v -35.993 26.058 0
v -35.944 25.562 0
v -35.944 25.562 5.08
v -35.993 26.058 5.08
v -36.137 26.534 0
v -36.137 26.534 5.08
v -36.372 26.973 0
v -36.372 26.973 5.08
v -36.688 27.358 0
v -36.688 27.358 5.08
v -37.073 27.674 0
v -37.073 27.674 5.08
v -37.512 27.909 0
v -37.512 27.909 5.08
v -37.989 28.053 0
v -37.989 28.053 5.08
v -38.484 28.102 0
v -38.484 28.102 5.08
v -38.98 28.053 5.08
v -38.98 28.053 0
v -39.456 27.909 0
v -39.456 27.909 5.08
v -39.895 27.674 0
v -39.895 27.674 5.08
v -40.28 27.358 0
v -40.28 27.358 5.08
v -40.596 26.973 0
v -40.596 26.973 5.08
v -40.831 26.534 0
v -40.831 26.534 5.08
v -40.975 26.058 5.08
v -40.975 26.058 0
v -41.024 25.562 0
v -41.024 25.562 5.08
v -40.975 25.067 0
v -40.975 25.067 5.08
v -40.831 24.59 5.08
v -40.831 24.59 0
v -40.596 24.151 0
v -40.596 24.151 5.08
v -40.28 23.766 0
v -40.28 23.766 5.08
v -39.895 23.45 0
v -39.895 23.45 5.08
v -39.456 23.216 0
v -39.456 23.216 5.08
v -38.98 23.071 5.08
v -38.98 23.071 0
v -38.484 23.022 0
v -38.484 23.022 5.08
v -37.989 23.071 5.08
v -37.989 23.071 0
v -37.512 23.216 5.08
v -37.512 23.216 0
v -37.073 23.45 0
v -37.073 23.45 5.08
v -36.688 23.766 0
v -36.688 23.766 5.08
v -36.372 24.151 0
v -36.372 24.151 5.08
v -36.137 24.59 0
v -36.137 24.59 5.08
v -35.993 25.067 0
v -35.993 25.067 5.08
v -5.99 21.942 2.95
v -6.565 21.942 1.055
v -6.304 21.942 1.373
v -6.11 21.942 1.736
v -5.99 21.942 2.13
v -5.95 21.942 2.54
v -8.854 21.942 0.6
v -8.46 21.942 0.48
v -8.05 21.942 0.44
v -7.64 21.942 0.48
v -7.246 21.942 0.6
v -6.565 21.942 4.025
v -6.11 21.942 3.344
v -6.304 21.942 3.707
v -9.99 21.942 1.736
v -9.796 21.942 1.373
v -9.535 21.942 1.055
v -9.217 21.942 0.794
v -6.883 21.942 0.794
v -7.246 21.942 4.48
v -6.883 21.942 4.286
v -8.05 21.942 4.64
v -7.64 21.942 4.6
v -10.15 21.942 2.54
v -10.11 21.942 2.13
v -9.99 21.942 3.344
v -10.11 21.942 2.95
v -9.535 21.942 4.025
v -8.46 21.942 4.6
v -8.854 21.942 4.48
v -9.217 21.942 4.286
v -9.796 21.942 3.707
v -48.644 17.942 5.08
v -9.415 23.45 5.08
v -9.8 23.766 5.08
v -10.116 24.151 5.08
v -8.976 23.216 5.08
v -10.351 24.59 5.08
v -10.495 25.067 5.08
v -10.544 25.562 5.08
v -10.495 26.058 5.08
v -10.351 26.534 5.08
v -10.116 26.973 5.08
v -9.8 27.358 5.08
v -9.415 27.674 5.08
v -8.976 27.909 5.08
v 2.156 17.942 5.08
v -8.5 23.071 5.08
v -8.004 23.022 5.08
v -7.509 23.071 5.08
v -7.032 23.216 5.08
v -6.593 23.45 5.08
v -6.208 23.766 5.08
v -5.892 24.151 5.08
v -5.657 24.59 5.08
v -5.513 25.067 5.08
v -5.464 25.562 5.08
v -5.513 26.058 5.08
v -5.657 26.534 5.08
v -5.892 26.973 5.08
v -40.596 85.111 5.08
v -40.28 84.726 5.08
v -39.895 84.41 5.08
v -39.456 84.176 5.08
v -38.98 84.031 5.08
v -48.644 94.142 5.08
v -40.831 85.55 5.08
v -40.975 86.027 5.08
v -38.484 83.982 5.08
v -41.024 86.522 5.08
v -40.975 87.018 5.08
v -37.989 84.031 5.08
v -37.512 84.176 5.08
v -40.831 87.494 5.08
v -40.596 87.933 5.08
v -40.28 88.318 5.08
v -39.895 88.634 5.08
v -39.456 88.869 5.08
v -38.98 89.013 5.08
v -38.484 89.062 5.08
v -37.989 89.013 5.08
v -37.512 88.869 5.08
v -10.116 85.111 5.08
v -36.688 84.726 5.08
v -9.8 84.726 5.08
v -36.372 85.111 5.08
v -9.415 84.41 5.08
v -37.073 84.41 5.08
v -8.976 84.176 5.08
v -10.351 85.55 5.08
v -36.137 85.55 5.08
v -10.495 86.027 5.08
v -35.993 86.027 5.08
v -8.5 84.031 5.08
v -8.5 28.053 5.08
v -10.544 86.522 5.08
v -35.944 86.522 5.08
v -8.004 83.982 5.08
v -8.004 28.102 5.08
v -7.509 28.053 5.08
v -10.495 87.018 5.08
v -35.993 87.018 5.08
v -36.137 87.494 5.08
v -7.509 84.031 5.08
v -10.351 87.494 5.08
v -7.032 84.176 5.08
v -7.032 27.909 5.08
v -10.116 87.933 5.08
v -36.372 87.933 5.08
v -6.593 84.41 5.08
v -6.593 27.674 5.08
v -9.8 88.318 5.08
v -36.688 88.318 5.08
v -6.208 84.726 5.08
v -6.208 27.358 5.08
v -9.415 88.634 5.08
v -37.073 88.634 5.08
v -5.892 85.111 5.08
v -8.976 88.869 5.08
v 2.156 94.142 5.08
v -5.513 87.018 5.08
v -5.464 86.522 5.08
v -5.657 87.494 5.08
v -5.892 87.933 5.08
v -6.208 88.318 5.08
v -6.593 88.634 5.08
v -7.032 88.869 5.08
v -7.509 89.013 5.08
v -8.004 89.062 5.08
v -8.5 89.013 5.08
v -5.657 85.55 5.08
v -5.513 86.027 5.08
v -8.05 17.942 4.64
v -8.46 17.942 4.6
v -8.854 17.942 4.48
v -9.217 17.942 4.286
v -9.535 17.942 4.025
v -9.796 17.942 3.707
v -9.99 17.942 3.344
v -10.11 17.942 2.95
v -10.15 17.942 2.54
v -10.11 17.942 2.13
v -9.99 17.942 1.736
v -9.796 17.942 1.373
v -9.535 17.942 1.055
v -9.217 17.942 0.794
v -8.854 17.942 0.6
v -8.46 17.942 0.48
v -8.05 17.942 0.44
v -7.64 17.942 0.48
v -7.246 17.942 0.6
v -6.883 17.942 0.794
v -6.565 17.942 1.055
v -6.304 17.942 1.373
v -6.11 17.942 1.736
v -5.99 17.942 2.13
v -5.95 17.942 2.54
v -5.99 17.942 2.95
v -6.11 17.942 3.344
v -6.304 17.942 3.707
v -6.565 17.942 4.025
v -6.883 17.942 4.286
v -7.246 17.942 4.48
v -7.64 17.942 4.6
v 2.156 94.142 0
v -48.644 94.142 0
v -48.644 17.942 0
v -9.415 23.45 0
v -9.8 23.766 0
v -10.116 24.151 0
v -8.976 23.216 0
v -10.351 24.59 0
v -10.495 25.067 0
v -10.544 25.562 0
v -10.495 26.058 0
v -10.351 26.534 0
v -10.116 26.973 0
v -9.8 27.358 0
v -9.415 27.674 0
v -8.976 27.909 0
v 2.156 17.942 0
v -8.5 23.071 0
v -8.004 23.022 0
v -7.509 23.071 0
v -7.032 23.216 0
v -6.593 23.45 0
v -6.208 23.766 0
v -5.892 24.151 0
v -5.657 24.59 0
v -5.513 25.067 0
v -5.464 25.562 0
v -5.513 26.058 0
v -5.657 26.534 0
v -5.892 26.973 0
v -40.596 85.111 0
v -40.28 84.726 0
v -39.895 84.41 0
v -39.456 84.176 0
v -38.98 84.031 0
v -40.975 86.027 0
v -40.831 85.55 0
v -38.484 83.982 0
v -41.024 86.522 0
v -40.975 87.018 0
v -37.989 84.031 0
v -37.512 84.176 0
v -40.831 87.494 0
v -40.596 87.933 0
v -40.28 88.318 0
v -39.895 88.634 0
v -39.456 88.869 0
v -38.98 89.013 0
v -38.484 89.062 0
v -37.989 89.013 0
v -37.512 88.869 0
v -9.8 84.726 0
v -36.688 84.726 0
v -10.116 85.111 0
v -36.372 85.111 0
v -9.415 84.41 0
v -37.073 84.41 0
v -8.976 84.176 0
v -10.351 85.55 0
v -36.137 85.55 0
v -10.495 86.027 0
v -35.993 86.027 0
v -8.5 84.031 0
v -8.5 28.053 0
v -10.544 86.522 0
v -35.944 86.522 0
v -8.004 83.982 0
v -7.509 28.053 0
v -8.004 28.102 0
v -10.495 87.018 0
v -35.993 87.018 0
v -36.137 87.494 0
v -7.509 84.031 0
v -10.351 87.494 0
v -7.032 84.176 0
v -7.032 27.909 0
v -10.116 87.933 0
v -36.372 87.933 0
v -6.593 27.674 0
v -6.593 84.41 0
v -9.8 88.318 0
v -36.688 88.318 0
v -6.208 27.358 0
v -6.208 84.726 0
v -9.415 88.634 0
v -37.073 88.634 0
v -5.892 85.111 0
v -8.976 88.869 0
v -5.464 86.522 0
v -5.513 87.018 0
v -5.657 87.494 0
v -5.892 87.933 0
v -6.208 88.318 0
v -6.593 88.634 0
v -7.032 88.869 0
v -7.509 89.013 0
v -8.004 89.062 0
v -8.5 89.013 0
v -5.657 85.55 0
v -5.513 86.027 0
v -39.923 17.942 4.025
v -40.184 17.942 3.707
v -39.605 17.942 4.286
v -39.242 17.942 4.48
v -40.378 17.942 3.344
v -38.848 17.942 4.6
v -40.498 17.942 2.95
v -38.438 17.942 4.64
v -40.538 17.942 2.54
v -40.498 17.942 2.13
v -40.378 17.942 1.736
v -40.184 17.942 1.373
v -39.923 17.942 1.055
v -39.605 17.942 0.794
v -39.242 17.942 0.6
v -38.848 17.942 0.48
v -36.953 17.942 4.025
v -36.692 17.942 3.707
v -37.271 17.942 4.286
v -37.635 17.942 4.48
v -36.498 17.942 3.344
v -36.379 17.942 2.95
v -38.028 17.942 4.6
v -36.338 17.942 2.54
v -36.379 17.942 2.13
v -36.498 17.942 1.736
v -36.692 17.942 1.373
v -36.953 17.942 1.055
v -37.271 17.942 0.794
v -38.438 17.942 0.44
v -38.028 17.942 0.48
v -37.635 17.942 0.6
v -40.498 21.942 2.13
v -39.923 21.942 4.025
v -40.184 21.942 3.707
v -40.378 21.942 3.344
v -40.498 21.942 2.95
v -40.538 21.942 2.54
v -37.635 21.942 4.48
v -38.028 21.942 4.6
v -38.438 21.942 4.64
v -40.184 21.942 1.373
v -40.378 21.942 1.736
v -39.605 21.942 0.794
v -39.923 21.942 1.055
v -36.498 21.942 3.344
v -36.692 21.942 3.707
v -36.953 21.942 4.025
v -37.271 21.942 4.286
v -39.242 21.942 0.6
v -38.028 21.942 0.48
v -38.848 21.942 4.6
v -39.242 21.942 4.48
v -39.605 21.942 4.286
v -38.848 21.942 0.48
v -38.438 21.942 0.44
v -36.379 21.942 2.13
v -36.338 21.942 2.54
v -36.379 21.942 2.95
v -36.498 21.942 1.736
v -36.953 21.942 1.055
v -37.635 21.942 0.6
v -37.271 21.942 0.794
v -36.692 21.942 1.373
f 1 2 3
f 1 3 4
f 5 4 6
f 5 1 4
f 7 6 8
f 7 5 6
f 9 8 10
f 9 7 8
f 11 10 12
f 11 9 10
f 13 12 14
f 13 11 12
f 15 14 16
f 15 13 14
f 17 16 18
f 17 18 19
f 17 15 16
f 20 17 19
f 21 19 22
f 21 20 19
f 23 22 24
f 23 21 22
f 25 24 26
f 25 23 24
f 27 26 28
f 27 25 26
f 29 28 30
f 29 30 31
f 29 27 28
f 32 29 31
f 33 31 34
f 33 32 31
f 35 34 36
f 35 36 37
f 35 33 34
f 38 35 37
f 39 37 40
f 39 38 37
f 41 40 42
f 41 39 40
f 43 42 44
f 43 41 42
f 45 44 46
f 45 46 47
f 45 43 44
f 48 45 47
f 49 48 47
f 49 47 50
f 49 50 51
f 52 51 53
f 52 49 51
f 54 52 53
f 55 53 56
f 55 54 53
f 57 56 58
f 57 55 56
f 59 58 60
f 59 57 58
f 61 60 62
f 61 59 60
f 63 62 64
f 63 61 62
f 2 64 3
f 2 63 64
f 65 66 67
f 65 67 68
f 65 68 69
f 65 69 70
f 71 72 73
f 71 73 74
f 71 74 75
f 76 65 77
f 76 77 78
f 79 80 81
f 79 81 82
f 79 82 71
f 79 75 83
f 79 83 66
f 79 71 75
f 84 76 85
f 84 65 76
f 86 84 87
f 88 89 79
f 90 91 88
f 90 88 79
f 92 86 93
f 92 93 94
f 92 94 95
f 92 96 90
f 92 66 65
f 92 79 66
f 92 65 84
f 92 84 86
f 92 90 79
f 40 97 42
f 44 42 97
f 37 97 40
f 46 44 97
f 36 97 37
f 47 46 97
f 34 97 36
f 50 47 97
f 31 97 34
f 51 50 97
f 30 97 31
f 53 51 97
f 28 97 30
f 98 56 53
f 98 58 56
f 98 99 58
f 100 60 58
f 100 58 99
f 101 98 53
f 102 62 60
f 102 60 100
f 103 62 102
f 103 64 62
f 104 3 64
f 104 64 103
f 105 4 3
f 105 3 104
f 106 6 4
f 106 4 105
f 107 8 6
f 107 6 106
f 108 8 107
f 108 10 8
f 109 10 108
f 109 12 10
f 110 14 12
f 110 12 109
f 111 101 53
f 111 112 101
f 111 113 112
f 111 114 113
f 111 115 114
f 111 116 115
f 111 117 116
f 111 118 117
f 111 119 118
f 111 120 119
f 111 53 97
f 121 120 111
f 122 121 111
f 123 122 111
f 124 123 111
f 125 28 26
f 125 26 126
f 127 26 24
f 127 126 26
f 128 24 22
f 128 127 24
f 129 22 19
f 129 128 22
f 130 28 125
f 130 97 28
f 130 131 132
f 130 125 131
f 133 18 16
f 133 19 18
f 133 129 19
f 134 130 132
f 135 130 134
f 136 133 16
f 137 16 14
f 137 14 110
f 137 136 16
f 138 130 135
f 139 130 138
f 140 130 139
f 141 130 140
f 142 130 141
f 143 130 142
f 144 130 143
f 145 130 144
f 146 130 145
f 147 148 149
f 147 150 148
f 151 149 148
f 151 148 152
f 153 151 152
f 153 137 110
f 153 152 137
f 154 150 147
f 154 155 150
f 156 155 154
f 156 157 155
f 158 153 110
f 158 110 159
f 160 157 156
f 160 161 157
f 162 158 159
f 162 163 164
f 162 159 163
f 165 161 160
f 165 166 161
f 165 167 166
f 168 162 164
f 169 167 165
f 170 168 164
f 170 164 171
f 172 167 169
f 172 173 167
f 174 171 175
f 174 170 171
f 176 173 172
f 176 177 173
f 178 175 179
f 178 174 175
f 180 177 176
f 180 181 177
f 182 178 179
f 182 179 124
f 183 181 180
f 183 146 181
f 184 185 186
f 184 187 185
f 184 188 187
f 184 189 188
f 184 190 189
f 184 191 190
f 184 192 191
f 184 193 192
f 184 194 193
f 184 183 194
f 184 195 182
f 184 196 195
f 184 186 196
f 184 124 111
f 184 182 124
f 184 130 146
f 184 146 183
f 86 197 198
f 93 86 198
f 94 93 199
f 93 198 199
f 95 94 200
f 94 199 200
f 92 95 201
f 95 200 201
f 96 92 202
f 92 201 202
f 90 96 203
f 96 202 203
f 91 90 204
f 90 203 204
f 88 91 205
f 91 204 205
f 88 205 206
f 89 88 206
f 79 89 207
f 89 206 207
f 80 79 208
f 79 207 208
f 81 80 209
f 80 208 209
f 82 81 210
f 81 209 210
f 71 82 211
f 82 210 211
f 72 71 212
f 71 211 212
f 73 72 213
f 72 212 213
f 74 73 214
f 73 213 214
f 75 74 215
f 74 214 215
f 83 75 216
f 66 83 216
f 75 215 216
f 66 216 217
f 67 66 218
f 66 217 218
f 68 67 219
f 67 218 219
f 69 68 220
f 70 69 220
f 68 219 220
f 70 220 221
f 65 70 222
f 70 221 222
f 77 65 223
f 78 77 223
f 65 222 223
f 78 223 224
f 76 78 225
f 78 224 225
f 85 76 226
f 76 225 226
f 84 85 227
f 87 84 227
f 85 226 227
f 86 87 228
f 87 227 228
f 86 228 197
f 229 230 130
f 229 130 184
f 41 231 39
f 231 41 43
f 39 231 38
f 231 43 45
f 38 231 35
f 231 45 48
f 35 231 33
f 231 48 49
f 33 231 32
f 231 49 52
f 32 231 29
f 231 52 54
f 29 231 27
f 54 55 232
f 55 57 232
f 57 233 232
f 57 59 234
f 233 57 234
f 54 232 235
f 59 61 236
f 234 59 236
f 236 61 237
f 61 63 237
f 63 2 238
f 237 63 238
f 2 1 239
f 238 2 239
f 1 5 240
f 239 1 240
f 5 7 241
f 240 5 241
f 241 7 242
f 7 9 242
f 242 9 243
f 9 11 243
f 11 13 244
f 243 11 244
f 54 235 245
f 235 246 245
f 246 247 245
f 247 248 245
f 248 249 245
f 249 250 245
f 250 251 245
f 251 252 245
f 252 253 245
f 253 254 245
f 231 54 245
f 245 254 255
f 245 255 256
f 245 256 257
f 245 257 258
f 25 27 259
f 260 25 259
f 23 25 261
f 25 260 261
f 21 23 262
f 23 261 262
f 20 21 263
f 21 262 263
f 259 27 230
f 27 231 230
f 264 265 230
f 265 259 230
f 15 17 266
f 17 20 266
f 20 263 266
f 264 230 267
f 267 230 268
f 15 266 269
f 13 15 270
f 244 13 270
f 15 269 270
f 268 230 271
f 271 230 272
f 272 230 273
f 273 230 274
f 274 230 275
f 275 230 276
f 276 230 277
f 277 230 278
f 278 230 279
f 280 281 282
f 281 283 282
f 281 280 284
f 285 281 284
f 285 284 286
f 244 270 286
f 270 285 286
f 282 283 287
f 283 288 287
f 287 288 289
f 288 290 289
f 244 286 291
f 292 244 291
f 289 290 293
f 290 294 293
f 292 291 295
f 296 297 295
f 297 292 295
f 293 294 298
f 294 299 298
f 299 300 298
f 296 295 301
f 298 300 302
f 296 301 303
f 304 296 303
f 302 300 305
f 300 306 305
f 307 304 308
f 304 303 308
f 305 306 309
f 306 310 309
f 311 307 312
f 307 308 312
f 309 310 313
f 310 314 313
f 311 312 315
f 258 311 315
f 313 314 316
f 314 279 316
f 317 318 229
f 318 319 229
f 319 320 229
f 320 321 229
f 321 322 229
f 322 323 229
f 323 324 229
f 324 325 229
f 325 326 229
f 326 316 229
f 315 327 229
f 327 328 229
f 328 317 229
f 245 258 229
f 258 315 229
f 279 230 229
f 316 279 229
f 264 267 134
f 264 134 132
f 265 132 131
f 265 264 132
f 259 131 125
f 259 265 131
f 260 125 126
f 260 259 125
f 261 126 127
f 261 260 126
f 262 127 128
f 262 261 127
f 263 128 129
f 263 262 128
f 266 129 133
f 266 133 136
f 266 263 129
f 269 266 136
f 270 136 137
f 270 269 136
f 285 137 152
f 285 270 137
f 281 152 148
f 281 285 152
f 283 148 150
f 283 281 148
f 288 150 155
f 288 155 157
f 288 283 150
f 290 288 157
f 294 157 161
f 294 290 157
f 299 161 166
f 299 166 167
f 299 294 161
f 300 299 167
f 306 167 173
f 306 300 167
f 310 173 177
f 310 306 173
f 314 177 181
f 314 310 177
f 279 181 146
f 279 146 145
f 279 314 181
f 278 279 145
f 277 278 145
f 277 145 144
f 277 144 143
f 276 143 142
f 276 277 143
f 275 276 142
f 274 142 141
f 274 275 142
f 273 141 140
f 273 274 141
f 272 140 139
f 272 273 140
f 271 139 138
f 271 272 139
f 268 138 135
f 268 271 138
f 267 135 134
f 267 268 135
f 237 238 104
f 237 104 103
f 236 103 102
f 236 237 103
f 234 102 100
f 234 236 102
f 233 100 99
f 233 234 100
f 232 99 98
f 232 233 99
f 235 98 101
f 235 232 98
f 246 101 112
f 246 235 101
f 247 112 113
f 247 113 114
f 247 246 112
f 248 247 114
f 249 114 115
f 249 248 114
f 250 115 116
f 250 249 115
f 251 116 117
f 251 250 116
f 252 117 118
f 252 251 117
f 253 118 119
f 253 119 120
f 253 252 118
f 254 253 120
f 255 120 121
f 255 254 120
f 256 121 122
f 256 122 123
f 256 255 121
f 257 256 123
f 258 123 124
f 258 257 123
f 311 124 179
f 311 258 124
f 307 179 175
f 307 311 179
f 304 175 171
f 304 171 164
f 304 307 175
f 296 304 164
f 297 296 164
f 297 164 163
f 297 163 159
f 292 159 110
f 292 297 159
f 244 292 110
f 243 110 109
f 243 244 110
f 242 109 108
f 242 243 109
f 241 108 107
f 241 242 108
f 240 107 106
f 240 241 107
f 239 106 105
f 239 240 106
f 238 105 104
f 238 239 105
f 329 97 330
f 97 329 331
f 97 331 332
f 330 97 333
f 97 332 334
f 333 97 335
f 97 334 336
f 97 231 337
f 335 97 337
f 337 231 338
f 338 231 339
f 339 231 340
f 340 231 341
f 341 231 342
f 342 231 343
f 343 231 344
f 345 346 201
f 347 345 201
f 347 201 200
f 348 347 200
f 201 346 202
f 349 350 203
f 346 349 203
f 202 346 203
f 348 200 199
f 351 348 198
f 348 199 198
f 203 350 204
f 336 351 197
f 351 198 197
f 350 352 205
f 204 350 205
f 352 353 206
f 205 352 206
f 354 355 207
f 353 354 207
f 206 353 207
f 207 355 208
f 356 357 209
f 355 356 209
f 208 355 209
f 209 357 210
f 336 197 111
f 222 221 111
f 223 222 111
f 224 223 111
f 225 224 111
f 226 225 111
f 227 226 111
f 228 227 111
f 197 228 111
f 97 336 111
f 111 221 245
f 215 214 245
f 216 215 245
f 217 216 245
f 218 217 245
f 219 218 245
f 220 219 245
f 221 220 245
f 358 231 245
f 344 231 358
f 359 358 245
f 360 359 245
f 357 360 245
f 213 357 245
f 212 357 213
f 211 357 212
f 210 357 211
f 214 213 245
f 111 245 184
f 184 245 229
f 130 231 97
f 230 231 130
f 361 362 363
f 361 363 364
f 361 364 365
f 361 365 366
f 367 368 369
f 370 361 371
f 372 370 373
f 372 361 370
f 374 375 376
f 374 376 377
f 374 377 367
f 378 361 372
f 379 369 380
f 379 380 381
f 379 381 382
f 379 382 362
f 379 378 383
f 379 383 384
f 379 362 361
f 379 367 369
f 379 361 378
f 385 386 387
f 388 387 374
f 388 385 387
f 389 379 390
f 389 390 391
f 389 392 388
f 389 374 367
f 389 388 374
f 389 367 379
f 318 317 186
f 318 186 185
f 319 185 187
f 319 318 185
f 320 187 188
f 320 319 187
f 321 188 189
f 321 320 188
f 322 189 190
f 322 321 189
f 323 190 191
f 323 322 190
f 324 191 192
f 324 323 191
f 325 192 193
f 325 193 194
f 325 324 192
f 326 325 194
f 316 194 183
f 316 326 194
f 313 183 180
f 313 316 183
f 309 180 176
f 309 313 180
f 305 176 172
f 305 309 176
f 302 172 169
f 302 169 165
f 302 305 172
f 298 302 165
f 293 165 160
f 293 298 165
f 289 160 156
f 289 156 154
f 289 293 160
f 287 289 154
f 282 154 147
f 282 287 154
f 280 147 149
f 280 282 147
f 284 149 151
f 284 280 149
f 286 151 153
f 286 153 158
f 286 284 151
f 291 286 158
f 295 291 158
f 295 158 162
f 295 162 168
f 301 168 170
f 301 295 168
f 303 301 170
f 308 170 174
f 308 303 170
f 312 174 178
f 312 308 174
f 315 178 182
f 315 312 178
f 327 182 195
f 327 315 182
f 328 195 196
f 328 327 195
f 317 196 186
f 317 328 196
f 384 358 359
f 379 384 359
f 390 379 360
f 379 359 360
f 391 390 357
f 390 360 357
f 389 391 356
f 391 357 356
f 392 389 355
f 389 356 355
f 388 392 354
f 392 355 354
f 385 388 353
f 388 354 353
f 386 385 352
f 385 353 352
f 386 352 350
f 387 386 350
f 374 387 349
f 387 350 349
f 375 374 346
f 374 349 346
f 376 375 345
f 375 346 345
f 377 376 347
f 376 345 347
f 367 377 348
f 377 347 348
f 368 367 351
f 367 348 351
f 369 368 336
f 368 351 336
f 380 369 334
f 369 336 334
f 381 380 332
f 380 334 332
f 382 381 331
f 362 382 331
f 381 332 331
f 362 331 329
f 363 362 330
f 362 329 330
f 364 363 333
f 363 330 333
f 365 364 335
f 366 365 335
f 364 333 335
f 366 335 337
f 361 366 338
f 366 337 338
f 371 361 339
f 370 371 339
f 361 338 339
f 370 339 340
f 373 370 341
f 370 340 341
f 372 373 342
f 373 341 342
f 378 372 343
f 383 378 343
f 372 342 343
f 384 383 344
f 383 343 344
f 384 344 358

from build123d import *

# Parameters (mm, degrees)
SKETCH1_W           = 50.8
SKETCH1_H           = 76.2
SKETCH1_R           = 2.54
BOSS_EXTRUDE1_DEPTH = 5.08
SKETCH2_R           = 2.1
CUT_EXTRUDE1_DEPTH  = 4


with BuildPart() as part:
    # Sketch1 → Boss-Extrude1 (new body)
    with BuildSketch(Plane.XY):
        with Locations((-23.244105975, 56.042212855)):
            Rectangle(SKETCH1_W, SKETCH1_H)
        with Locations((-38.484105975, 25.562212855)):
            Circle(SKETCH1_R, mode=Mode.SUBTRACT)
        with Locations(Location((-8.004105975, 25.562212855, 0), (0, 0, 180))):
            Circle(SKETCH1_R, mode=Mode.SUBTRACT)
        with Locations((-8.004105975, 86.522212855)):
            Circle(SKETCH1_R, mode=Mode.SUBTRACT)
        with Locations(Location((-38.484105975, 86.522212855, 0), (0, 0, 180))):
            Circle(SKETCH1_R, mode=Mode.SUBTRACT)
    extrude(amount=BOSS_EXTRUDE1_DEPTH)

    # Sketch2 → Cut-Extrude1 (cut)
    with BuildSketch(Plane.XZ.offset(-17.942212855)):
        with Locations(Location((-38.438159235, 2.54, 0), (0, 0, 270))):
            Circle(SKETCH2_R)
        with Locations(Location((-8.050052715, 2.54, 0), (0, 0, 90))):
            Circle(SKETCH2_R)
    extrude(amount=-CUT_EXTRUDE1_DEPTH, mode=Mode.SUBTRACT)


solid = part.part
